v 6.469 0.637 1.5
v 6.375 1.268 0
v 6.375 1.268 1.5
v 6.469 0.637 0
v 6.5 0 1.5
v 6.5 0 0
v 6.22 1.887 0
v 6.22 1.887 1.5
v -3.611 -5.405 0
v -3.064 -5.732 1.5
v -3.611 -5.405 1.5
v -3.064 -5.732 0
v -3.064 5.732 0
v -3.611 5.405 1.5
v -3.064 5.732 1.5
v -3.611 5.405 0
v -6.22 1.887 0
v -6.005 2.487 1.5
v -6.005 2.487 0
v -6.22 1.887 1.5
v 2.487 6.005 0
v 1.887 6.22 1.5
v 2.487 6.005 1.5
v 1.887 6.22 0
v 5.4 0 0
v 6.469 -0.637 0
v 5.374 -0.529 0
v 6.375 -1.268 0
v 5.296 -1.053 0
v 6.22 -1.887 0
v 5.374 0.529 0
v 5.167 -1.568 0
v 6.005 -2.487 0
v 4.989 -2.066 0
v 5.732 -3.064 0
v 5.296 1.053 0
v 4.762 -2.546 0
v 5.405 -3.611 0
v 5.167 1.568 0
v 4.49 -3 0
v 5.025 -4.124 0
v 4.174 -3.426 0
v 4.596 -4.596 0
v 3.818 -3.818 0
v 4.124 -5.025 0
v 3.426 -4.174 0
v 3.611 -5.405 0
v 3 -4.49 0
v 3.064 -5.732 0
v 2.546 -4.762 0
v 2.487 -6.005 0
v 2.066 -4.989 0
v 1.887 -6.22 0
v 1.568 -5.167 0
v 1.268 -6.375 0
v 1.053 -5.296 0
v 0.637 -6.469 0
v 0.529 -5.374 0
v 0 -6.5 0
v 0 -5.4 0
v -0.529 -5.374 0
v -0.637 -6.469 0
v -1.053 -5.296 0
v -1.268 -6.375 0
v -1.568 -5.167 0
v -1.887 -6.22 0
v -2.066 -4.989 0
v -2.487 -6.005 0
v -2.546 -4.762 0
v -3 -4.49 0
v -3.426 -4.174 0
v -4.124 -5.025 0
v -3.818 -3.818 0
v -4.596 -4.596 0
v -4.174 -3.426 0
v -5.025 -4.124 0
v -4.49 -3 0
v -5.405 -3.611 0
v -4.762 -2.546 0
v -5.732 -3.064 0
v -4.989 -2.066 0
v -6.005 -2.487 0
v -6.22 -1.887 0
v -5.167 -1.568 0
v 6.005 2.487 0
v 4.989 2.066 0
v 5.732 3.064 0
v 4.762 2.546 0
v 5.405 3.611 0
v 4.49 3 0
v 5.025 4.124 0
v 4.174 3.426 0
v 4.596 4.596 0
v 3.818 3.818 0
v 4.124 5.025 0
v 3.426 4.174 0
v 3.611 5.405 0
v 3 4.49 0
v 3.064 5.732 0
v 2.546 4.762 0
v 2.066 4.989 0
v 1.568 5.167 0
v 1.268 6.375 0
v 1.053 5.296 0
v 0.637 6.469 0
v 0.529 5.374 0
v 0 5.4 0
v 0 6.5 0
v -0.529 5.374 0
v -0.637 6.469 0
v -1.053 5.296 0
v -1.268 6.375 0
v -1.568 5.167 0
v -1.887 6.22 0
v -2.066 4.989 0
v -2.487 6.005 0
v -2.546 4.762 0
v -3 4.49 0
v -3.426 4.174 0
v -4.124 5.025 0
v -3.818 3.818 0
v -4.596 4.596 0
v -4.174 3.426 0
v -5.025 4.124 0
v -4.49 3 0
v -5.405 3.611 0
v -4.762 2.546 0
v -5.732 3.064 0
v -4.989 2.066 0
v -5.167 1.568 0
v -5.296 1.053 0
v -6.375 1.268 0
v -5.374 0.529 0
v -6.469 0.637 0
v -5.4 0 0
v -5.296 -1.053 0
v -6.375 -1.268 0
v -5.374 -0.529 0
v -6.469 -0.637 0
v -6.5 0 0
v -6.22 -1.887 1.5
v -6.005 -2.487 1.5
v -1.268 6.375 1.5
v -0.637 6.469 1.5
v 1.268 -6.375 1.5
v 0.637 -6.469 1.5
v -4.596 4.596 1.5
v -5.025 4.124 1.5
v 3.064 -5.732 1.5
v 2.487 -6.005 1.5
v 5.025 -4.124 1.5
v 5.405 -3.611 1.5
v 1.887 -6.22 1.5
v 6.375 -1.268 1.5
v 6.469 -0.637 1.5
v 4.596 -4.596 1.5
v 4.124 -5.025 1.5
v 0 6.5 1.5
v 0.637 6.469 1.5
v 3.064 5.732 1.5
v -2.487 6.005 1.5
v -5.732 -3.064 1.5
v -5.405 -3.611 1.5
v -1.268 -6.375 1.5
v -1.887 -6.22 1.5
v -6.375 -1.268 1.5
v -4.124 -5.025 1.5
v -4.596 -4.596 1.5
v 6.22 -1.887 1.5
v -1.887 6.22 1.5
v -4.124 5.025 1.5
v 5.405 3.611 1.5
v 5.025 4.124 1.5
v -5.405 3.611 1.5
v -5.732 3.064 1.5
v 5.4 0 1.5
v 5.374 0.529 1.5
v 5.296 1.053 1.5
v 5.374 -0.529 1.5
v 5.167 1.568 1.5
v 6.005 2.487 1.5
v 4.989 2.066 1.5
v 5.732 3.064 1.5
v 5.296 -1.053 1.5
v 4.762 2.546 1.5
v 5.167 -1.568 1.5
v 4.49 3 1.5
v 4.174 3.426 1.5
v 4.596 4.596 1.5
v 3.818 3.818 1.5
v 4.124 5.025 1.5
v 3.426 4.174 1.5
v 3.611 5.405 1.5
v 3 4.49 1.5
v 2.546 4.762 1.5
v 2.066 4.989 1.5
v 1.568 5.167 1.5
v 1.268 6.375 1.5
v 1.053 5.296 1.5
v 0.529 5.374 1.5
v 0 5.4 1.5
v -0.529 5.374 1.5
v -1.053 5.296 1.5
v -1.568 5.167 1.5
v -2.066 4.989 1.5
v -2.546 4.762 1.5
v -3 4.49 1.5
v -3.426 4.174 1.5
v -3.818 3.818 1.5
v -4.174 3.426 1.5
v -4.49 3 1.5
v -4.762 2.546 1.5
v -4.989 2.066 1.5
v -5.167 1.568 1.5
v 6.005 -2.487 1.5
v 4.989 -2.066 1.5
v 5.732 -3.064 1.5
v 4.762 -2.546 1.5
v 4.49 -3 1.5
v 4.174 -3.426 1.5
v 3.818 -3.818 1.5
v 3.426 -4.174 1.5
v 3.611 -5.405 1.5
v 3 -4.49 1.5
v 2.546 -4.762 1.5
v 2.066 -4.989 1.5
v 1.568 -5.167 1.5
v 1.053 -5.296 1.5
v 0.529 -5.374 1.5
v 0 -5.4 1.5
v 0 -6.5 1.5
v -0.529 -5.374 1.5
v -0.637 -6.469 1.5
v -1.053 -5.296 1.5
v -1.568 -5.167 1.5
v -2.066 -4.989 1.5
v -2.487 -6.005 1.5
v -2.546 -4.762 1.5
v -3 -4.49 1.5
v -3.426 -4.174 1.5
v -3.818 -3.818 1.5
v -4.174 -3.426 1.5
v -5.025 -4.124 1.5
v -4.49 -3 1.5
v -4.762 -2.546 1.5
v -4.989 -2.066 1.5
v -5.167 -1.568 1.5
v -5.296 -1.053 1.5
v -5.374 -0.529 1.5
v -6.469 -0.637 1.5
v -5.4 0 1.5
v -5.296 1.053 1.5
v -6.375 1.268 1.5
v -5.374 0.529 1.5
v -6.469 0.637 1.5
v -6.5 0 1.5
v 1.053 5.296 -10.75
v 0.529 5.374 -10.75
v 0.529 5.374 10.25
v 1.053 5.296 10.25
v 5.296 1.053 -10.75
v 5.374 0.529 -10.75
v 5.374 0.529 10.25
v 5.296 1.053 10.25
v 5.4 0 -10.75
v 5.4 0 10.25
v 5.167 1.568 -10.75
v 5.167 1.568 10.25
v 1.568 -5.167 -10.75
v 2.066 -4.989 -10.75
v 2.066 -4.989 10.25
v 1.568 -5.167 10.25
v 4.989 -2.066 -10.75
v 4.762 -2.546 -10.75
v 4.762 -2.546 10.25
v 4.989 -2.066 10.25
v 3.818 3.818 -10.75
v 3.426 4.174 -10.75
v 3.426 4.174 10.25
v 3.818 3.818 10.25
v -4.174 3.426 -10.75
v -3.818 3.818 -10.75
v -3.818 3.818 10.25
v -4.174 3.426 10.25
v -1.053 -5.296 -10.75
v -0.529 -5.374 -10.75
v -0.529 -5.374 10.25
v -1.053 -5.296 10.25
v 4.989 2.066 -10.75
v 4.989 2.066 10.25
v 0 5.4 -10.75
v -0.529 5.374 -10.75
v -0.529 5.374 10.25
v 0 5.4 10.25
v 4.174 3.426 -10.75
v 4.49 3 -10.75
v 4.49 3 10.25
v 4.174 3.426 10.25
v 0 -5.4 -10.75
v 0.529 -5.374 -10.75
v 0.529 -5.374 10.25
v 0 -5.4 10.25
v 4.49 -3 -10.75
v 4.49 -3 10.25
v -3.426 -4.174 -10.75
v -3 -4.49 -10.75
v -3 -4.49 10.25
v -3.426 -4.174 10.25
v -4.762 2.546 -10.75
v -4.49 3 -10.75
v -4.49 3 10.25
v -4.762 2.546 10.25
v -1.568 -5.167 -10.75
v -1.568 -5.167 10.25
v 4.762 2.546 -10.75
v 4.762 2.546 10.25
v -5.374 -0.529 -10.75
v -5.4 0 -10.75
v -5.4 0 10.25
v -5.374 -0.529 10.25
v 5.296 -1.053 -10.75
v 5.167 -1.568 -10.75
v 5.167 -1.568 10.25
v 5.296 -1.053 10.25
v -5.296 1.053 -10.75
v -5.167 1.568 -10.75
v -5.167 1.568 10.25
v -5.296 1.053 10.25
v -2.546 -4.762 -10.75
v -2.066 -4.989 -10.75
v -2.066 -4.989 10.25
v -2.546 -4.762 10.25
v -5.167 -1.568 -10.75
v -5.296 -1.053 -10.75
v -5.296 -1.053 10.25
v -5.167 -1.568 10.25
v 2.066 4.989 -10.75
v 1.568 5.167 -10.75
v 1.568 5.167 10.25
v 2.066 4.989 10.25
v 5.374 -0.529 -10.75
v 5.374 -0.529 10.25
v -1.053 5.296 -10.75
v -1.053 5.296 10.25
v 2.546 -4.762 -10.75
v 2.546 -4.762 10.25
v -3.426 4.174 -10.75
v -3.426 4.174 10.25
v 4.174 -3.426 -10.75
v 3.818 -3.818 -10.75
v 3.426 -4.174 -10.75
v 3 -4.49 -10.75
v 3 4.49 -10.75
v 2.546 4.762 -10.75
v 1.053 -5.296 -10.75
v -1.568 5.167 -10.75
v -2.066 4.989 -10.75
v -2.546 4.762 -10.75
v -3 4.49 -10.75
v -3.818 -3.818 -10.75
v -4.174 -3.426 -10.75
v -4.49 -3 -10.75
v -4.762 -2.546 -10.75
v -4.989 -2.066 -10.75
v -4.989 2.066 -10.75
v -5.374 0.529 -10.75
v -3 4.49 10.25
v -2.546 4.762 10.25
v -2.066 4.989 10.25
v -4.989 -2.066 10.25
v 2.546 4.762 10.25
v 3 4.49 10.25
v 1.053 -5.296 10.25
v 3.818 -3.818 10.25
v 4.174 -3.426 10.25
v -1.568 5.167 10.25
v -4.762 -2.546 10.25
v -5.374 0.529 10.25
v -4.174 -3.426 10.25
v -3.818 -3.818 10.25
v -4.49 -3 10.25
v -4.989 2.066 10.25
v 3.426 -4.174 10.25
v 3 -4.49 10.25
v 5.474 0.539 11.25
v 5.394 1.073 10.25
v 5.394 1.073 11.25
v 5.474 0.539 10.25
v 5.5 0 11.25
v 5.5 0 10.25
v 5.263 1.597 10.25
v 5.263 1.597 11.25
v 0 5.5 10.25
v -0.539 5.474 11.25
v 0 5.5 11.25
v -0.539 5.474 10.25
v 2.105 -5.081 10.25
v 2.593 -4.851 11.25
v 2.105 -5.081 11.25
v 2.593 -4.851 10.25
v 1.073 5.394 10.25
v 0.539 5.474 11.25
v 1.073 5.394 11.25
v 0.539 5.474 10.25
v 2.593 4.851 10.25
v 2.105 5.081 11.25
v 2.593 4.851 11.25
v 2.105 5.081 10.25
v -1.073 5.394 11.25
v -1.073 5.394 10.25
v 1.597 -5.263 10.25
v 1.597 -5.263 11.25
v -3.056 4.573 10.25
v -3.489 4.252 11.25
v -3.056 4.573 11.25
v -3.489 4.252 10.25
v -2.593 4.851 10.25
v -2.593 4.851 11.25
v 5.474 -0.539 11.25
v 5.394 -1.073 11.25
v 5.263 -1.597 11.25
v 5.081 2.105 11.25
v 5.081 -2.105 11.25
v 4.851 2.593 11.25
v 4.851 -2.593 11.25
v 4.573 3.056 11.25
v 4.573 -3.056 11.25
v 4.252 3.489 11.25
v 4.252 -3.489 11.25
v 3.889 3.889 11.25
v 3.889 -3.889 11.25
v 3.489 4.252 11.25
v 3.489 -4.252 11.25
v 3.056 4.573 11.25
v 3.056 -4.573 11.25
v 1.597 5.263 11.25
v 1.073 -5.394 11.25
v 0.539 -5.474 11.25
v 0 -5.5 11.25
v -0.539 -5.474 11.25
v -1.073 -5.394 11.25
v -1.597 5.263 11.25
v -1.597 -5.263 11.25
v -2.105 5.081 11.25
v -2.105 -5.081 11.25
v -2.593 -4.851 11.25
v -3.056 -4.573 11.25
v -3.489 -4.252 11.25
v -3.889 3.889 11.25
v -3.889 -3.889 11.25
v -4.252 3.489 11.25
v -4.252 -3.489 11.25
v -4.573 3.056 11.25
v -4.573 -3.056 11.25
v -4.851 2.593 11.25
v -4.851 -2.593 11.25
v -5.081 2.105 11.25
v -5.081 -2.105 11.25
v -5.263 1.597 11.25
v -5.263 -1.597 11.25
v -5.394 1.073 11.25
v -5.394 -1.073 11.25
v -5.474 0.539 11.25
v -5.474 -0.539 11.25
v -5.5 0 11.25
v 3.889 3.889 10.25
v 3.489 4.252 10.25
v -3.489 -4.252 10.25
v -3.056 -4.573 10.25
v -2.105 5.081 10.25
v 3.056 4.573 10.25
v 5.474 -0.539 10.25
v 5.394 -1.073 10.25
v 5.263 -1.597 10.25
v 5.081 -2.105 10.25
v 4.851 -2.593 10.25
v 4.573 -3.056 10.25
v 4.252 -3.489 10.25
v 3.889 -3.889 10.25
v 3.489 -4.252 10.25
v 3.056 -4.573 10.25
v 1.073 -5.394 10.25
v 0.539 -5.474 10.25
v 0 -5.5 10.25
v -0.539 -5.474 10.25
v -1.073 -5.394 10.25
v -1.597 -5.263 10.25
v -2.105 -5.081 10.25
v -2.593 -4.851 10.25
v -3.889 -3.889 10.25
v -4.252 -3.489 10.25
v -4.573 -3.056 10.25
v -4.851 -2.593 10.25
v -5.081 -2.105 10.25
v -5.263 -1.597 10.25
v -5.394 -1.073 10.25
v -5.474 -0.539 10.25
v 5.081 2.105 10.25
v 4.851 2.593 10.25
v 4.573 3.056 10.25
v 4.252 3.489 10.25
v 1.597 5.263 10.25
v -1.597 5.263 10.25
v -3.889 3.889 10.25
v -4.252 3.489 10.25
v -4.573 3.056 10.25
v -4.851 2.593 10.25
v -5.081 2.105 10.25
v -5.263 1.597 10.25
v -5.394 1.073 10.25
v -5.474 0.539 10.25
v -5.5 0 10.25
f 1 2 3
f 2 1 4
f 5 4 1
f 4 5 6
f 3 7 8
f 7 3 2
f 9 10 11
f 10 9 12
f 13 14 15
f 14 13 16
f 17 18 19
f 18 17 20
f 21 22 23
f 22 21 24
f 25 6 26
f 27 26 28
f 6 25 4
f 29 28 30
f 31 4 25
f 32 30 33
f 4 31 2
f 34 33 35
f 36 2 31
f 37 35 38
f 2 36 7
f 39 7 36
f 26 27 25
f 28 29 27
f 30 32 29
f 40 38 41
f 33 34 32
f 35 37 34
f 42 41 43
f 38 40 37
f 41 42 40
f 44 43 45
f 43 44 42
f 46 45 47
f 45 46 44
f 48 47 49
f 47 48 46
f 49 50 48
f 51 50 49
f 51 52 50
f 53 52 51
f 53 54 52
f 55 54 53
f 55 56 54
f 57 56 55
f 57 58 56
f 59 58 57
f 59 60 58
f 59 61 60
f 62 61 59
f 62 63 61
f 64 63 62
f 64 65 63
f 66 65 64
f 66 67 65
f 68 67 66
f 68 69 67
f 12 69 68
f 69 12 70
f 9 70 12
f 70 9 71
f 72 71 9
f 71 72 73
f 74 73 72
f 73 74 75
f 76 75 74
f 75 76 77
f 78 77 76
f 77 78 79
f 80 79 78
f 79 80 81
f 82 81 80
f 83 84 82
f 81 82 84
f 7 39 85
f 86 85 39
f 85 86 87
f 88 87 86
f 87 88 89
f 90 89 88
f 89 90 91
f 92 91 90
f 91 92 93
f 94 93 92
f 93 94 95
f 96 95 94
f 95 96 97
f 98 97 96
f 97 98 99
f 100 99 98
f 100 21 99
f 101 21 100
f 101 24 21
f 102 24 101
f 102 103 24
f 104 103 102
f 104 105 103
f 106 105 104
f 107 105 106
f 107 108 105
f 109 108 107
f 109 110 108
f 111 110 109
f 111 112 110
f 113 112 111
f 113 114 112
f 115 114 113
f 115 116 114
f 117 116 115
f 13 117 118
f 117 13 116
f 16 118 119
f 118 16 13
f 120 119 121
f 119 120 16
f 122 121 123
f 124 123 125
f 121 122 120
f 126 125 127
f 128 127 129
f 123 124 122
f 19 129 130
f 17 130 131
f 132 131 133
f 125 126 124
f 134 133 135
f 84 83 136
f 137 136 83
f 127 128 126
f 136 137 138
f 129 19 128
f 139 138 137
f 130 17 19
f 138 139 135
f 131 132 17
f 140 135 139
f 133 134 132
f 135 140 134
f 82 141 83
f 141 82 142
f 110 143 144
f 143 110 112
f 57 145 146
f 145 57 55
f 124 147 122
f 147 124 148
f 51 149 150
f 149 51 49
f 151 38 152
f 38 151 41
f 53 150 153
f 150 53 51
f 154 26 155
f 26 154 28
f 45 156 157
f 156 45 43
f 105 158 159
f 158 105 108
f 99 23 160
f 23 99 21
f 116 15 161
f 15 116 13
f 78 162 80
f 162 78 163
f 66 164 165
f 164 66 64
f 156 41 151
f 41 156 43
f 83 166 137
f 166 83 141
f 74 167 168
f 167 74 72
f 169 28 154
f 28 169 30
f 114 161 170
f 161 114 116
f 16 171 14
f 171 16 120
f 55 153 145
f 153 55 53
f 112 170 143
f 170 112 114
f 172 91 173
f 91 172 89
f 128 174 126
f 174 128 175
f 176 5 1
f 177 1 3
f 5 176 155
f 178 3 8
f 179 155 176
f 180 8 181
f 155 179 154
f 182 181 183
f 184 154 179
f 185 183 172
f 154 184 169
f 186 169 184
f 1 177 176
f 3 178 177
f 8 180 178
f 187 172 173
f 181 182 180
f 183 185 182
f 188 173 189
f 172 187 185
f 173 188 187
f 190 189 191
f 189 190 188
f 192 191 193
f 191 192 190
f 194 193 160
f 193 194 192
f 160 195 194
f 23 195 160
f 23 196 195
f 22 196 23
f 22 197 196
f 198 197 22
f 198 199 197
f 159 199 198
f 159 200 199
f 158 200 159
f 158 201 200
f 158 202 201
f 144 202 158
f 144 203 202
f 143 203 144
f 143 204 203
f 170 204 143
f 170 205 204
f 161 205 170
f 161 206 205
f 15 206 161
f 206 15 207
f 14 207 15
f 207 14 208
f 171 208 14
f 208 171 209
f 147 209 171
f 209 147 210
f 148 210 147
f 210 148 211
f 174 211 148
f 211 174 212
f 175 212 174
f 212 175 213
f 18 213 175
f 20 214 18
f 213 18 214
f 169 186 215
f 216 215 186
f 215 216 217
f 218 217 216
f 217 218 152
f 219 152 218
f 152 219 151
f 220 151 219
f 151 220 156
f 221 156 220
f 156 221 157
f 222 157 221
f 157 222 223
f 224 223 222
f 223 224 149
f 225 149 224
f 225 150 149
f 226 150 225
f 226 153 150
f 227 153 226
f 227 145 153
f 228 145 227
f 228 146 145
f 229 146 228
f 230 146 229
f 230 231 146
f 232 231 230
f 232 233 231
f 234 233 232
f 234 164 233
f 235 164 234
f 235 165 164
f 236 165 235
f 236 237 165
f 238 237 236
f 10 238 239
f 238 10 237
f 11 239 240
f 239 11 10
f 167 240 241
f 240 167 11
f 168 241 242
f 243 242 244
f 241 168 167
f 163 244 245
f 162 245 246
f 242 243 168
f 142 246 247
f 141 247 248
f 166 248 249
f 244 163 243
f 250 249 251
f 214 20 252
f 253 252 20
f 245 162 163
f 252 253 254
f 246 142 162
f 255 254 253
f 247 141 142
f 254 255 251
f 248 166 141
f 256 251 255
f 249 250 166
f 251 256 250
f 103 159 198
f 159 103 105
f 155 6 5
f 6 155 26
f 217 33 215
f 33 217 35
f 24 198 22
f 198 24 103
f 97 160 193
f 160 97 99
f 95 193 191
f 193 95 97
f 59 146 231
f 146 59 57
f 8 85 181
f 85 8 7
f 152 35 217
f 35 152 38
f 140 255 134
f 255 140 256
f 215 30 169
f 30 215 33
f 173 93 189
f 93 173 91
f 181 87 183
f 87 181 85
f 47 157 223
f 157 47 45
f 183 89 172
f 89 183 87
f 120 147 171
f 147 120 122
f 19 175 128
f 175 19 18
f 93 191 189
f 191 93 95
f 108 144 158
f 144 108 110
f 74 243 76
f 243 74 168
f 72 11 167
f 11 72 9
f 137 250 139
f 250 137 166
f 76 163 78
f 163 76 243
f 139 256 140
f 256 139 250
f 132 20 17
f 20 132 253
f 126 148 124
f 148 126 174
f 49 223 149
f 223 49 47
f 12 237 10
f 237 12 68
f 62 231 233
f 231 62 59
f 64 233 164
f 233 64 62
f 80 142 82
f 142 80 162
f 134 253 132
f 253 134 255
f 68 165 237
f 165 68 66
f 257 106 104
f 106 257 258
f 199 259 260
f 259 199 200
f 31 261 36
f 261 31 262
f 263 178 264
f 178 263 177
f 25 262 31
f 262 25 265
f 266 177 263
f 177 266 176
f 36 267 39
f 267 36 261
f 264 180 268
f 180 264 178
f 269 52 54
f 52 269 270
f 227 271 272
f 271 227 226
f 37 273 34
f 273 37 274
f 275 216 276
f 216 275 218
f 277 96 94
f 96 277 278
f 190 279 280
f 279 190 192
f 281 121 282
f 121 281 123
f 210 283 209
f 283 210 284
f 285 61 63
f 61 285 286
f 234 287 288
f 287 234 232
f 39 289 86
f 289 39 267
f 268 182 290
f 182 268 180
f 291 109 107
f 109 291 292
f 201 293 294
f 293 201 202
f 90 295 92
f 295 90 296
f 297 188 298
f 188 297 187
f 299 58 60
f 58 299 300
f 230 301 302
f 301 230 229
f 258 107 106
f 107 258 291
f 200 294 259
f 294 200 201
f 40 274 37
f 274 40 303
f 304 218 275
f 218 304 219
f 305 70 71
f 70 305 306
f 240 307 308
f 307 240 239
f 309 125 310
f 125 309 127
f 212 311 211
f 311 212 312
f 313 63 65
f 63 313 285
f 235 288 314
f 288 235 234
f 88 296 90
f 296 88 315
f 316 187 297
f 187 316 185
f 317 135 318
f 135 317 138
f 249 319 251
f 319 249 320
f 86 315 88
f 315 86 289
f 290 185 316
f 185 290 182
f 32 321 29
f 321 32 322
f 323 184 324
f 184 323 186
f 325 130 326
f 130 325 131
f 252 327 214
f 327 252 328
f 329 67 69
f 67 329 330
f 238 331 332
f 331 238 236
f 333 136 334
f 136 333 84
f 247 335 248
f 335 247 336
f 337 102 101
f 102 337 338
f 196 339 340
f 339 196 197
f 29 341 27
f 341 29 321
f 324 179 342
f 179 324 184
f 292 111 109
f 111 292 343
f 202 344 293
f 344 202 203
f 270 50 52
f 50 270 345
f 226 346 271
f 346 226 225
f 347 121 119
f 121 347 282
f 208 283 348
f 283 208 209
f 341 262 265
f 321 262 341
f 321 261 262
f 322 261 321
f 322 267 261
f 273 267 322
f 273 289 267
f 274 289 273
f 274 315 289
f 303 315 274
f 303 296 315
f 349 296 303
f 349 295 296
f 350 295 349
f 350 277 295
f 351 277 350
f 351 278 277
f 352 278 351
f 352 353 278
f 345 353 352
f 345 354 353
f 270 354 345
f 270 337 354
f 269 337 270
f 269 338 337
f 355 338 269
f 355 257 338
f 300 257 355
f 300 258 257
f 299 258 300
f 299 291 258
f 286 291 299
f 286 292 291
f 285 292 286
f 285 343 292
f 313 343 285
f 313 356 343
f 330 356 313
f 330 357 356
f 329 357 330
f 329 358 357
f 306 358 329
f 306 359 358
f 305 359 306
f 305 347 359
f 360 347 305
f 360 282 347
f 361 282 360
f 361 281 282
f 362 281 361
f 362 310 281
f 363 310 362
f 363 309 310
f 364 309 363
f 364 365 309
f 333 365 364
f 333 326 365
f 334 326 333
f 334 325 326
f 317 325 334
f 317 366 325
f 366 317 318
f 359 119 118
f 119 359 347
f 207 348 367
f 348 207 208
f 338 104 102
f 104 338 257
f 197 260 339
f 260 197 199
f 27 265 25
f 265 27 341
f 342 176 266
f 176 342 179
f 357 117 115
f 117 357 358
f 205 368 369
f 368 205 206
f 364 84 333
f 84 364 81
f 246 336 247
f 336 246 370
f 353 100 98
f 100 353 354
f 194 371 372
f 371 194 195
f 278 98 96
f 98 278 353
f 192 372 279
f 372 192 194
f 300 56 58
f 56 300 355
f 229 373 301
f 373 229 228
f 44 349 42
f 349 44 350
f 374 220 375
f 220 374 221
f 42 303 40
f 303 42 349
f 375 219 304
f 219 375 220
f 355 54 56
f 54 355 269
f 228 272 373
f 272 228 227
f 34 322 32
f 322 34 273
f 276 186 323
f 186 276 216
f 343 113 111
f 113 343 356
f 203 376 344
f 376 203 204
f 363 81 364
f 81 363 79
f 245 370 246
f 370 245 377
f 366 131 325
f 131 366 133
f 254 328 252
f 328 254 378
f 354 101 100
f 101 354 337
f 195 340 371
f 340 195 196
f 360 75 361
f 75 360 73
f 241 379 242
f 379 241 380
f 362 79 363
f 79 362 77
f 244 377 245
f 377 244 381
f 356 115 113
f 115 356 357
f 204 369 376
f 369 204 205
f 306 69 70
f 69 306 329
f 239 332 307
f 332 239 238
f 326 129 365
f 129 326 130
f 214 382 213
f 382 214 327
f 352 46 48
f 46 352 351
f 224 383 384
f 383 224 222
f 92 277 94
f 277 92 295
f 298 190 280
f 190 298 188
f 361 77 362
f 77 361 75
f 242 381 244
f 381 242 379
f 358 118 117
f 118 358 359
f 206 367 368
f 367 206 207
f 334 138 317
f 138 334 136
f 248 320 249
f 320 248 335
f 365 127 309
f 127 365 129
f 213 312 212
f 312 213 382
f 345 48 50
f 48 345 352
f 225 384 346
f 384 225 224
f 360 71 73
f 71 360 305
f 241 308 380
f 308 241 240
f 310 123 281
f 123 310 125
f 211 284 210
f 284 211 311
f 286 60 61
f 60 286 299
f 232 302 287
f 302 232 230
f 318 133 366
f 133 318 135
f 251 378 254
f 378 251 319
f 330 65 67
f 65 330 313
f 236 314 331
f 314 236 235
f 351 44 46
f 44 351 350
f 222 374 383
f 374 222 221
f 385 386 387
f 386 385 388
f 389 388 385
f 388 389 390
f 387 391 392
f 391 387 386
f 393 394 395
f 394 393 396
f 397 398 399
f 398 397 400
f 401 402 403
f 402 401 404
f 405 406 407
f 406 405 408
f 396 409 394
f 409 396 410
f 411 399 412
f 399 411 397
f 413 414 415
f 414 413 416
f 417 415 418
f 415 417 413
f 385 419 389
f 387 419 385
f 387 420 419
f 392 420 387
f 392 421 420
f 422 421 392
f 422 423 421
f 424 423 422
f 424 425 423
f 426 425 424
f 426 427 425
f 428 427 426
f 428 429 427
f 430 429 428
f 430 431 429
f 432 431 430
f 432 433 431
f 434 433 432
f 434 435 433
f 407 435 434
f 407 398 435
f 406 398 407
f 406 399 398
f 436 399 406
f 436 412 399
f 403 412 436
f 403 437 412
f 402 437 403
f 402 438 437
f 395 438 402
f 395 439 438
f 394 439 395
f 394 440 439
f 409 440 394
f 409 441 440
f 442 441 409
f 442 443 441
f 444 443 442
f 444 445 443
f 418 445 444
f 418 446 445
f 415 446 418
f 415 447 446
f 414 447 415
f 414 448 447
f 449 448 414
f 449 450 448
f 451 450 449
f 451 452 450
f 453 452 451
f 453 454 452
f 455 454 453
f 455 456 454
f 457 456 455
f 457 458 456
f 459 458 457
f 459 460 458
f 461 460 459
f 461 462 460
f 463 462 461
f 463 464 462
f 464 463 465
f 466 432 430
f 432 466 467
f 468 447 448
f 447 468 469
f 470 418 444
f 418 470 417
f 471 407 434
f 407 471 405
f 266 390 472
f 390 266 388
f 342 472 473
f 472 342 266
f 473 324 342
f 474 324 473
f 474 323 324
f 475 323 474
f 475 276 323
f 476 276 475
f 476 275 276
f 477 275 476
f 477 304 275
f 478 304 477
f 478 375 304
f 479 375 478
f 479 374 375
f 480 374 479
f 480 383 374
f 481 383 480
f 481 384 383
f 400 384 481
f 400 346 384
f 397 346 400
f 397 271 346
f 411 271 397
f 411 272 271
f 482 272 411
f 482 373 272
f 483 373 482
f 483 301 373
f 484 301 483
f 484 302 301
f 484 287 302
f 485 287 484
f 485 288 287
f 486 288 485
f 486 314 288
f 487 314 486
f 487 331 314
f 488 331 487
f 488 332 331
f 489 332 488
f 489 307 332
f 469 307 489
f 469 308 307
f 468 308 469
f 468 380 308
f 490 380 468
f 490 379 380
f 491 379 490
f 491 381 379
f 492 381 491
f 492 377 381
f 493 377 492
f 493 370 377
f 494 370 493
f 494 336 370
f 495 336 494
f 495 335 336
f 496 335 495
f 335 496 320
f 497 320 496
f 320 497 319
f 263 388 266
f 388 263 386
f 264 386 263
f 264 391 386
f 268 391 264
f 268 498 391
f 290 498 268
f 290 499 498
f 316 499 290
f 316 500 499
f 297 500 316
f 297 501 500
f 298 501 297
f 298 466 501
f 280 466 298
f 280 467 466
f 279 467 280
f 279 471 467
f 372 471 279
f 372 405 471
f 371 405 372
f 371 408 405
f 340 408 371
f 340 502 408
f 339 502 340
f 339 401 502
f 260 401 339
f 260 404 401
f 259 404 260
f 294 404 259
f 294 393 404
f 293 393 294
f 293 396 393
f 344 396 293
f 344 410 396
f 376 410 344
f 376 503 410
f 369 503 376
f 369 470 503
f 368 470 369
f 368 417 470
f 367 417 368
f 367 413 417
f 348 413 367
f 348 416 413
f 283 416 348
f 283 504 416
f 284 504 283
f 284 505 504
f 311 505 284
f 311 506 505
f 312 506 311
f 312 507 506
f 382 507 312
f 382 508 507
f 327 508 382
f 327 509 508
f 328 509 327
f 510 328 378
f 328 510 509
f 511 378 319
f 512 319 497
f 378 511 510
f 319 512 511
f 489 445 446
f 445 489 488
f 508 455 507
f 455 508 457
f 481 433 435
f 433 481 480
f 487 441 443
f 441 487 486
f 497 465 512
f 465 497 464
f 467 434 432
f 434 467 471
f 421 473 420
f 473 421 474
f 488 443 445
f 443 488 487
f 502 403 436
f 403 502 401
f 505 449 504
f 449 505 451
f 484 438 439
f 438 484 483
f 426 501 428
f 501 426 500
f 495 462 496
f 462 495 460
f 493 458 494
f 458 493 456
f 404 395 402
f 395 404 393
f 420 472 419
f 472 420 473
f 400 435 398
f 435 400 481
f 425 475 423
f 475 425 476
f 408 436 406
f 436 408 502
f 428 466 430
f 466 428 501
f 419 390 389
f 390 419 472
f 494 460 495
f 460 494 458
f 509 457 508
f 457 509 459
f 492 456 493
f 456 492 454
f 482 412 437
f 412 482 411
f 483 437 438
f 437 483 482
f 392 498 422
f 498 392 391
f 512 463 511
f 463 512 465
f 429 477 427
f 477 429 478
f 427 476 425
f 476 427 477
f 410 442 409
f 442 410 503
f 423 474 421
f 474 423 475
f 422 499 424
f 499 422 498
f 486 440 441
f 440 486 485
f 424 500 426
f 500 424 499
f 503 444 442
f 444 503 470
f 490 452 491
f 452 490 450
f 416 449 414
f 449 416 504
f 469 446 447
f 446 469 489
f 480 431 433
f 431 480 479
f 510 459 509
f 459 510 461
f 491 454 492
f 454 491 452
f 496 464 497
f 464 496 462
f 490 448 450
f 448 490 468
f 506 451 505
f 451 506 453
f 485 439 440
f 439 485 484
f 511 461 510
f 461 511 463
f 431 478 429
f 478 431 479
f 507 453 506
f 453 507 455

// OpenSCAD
// Dimensions for 0.2 mL PCR Tube Adapter
// Units: mm

// Physical Dimensions
sleeve_outer_diameter = 10.8;   // Outer diameter of the main body
collar_diameter = 13.0;         // Diameter of the base collar
collar_thickness = 1.5;         // Height of the base collar
sleeve_height = 21.5;           // Total height of the sleeve body
bore_diameter = 6.2;            // Diameter of the internal bore

// Derived Dimensions
bore_radius = bore_diameter / 2;
sleeve_radius = sleeve_outer_diameter / 2;
collar_radius = collar_diameter / 2;
wall_thickness = sleeve_radius - bore_radius;

// Rendering Settings
$fn = 64; // High resolution for curved surfaces

// Main Assembly
union() {
    // 1. Base Collar (Rests on bed)
    translate([0, 0, collar_thickness / 2])
    cylinder(h = collar_thickness, r = collar_radius, center = true);

    // 2. Main Sleeve Body
    // We build the body as a cylinder with a hole, then subtract the top cap
    // to ensure the bore is open at both ends.
    cylinder(h = sleeve_height, r = sleeve_radius, center = true);

    // 3. Top Cap (to create the open bore)
    // We cut a thin disc out of the top of the cylinder to leave the bore open.
    // We extend the cutter slightly past the top face to ensure clean separation.
    translate([0, 0, sleeve_height / 2])
    cylinder(h = 1.0, r = sleeve_radius + 0.1, center = true);
}
